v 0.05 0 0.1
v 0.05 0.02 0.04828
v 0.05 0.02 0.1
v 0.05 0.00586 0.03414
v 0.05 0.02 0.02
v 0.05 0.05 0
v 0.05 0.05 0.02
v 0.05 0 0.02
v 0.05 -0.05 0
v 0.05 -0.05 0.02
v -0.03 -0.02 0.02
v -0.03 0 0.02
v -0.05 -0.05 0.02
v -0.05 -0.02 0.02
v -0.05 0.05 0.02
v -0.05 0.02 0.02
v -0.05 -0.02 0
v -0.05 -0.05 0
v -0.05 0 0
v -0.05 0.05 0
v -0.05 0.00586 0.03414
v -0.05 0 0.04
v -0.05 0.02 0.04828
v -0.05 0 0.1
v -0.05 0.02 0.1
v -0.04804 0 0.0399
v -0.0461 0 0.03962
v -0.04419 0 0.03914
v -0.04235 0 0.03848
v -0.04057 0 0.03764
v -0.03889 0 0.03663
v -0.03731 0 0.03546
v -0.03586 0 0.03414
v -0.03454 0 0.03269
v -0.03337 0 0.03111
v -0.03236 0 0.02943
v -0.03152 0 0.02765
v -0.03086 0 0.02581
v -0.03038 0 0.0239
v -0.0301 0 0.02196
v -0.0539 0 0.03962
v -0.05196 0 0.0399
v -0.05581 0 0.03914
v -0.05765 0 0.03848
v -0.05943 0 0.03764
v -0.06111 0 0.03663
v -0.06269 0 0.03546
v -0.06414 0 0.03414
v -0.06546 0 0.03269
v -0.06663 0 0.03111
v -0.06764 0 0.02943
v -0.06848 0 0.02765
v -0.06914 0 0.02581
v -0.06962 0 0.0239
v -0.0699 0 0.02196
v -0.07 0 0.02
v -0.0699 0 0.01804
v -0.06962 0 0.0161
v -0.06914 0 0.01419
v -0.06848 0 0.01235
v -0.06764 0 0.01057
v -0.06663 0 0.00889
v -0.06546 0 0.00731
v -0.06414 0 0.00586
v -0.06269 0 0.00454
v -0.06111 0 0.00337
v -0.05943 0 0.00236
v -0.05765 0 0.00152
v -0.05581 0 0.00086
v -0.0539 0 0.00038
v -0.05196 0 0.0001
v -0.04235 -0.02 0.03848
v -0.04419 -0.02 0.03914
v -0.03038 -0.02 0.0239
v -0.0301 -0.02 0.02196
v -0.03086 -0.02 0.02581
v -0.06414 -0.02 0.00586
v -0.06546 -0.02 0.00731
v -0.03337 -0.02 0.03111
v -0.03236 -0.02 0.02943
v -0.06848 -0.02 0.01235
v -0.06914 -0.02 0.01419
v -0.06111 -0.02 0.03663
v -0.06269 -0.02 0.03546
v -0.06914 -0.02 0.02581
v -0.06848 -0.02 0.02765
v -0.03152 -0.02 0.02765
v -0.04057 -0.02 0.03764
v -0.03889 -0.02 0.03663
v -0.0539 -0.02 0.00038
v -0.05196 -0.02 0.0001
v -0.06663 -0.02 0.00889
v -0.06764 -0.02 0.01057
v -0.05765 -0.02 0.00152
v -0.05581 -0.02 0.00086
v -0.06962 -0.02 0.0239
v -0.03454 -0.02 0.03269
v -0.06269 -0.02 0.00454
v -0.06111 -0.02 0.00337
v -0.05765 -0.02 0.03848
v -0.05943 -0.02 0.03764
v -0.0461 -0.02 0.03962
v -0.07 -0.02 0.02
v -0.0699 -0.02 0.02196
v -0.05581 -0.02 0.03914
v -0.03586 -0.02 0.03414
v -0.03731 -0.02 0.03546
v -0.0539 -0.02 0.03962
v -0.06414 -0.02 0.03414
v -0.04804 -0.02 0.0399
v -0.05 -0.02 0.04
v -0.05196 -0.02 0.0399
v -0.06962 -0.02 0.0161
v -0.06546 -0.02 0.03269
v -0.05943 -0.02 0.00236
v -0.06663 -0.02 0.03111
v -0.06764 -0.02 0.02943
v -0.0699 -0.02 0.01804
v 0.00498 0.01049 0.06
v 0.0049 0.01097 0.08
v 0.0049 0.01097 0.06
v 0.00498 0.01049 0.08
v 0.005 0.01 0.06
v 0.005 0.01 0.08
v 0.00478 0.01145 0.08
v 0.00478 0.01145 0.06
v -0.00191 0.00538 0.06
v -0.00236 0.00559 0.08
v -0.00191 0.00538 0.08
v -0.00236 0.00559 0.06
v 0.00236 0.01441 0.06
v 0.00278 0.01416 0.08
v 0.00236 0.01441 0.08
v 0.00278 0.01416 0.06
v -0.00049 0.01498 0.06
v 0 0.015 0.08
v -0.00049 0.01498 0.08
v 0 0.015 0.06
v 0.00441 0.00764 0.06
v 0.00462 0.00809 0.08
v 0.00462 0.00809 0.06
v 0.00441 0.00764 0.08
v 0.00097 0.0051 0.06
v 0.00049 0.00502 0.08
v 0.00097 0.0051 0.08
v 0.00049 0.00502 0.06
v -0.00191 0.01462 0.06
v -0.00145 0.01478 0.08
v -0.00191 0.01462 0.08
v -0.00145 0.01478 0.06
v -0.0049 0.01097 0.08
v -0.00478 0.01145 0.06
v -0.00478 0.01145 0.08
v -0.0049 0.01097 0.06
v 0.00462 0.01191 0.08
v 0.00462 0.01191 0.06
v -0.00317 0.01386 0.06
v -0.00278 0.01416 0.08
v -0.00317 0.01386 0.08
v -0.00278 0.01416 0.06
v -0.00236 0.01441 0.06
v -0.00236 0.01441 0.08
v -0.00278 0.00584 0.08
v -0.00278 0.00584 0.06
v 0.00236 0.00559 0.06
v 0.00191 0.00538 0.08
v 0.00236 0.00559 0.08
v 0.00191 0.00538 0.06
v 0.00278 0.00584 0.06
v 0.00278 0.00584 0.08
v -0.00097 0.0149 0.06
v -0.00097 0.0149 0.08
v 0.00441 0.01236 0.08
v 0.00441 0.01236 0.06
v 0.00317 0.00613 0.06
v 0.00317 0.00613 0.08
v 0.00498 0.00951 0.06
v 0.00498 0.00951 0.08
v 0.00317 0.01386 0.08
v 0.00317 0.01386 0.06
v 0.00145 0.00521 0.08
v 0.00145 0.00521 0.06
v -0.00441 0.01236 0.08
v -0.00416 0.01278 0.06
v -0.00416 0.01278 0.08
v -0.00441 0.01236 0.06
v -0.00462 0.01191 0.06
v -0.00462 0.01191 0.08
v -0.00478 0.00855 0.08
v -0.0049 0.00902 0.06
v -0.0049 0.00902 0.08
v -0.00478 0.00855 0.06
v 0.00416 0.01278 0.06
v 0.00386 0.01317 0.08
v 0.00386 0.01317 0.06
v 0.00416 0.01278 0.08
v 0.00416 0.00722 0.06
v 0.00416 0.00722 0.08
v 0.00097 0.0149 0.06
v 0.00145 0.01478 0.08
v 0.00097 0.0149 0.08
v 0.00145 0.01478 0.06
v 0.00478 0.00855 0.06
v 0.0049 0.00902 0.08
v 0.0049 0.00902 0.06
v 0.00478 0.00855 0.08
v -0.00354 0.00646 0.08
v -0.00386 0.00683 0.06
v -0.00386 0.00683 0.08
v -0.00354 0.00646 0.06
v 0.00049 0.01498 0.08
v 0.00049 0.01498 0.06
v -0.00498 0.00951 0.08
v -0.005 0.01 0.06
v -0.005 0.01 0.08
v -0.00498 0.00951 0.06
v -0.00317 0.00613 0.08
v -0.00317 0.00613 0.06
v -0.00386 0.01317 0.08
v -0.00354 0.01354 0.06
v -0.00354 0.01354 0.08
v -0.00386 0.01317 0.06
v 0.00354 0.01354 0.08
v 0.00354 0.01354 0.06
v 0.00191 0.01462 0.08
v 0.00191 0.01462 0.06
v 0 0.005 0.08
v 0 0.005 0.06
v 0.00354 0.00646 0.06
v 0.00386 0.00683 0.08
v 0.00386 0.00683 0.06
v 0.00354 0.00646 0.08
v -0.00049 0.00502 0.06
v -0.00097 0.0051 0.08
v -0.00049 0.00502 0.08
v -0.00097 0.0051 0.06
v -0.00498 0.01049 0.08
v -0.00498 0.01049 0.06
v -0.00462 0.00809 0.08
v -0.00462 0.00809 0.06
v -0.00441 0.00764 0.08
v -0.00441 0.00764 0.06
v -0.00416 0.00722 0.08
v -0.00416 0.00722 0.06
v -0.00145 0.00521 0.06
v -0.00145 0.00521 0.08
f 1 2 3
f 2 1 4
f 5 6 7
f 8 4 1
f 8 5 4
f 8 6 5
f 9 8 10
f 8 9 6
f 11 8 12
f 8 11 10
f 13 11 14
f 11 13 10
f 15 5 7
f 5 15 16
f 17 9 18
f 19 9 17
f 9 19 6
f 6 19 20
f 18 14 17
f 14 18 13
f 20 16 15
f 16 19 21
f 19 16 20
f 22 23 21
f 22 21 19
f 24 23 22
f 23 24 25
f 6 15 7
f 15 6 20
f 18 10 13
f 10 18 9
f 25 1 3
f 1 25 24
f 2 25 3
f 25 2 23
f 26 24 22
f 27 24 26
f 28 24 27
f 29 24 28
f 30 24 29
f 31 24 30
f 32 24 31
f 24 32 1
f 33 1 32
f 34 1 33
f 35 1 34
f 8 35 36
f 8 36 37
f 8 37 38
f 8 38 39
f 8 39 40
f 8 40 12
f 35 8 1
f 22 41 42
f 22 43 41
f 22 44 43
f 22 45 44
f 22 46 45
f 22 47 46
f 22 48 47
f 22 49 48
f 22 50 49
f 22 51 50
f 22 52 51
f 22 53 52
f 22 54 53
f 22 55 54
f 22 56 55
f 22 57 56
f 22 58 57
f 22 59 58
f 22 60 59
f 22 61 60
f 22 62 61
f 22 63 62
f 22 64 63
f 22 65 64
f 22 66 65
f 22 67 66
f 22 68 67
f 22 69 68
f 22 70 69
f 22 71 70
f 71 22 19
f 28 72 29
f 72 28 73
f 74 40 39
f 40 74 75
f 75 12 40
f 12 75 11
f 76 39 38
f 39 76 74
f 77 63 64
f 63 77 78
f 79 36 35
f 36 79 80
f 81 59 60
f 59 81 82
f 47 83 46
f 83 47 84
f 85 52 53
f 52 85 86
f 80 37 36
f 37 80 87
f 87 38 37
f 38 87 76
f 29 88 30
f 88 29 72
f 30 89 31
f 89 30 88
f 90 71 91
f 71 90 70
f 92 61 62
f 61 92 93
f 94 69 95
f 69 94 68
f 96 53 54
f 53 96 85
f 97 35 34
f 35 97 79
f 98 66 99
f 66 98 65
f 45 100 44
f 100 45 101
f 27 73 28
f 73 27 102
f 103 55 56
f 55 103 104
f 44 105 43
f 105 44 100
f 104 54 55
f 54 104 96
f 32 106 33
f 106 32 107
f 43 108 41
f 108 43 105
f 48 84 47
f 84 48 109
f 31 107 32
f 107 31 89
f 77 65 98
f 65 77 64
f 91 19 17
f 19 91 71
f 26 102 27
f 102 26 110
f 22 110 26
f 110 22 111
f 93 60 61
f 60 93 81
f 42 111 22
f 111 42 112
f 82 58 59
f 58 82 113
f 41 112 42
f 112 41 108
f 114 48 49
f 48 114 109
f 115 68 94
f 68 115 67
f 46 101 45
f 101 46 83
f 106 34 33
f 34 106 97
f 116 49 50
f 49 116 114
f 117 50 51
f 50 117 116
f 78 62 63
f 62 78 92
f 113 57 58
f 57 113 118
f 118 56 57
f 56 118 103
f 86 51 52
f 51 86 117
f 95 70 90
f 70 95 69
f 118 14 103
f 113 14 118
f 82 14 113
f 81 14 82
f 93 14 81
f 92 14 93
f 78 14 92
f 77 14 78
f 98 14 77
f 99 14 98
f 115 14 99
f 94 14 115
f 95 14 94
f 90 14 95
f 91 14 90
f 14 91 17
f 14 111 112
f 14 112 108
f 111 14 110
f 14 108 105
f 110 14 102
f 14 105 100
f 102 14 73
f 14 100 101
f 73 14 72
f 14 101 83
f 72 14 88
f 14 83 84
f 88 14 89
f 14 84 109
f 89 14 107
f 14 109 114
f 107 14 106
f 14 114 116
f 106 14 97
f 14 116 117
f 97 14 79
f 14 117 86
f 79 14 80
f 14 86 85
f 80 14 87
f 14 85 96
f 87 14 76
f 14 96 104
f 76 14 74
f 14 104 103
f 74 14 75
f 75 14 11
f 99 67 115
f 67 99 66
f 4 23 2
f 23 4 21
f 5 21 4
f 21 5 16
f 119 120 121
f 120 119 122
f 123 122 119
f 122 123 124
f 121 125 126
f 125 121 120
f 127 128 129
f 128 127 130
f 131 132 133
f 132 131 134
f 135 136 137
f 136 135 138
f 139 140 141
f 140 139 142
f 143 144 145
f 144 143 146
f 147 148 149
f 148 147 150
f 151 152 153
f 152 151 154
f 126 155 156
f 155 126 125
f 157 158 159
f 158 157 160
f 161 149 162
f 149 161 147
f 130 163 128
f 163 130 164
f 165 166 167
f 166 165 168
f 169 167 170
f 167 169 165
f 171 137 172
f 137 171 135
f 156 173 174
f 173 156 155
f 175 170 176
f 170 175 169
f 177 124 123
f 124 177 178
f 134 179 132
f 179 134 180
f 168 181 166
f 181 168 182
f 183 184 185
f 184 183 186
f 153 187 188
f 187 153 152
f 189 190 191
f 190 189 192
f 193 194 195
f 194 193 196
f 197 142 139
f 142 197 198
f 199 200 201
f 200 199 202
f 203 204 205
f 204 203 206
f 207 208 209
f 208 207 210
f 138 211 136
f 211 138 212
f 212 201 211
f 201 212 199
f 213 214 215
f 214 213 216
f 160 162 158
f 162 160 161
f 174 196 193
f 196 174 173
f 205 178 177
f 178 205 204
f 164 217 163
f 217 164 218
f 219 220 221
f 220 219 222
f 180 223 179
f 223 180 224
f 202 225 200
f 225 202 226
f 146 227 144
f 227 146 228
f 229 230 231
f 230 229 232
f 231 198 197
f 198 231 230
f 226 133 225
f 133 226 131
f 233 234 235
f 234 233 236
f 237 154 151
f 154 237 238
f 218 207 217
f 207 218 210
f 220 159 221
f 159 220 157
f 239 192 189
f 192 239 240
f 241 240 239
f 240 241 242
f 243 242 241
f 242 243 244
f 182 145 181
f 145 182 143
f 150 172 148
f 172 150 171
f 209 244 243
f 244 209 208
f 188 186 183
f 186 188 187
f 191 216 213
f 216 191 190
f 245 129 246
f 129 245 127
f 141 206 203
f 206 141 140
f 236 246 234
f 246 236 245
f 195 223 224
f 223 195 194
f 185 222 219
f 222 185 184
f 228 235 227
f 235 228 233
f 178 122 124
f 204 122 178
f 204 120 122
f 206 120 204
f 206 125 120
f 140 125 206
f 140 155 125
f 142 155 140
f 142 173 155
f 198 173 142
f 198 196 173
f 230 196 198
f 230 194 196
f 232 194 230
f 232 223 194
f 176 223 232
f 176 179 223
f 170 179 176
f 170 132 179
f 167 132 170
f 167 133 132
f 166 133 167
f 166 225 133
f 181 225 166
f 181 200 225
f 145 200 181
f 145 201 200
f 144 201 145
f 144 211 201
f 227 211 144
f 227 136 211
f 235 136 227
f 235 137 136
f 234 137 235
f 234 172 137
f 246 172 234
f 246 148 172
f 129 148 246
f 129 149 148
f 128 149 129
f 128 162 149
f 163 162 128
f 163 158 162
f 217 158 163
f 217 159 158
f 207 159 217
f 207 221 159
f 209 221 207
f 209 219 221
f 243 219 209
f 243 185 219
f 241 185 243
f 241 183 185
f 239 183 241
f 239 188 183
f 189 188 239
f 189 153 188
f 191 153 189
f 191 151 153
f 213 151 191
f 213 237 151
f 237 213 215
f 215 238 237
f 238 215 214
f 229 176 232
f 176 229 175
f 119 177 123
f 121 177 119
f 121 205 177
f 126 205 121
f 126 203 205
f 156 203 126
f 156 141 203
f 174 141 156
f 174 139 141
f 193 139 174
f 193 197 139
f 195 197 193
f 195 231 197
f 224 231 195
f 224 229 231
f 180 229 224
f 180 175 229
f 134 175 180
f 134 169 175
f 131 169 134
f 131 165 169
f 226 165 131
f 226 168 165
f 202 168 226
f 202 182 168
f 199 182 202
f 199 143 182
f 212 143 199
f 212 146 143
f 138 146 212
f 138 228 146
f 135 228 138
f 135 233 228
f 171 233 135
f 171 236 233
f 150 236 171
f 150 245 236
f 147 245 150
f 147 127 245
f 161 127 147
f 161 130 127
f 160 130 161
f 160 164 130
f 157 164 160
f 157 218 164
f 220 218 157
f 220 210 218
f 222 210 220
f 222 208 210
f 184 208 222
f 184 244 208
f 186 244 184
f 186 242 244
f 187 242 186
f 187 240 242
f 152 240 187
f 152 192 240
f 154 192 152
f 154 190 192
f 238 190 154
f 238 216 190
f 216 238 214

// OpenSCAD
module l_bracket() {
    difference() {
        union() {
            // Base plate
            translate([-0.05, -0.05, 0])
            cube([0.1, 0.1, 0.02]);

            // Upright plate
            translate([-0.05, 0, 0.02])
            cube([0.1, 0.02, 0.08]);

            // Internal fillet
            translate([-0.05, 0, 0.02])
            rotate([90, 0, 0])
            cylinder(r=0.02, h=0.02, $fn=64);
        }

        // Beveled region near the bend
        translate([-0.05, 0.02, 0.02])
        rotate([45, 0, 0])
        cube([0.1, 0.02, 0.02]);

        // Through-hole in the upright leg
        translate([0, 0.01, 0.06])
        cylinder(r=0.005, h=0.02, $fn=64);
    }
    
    // Thickened flange/lip along one edge
    translate([-0.05, -0.05, 0])
    cube([0.1, 0.01, 0.02]);
}

l_bracket();
